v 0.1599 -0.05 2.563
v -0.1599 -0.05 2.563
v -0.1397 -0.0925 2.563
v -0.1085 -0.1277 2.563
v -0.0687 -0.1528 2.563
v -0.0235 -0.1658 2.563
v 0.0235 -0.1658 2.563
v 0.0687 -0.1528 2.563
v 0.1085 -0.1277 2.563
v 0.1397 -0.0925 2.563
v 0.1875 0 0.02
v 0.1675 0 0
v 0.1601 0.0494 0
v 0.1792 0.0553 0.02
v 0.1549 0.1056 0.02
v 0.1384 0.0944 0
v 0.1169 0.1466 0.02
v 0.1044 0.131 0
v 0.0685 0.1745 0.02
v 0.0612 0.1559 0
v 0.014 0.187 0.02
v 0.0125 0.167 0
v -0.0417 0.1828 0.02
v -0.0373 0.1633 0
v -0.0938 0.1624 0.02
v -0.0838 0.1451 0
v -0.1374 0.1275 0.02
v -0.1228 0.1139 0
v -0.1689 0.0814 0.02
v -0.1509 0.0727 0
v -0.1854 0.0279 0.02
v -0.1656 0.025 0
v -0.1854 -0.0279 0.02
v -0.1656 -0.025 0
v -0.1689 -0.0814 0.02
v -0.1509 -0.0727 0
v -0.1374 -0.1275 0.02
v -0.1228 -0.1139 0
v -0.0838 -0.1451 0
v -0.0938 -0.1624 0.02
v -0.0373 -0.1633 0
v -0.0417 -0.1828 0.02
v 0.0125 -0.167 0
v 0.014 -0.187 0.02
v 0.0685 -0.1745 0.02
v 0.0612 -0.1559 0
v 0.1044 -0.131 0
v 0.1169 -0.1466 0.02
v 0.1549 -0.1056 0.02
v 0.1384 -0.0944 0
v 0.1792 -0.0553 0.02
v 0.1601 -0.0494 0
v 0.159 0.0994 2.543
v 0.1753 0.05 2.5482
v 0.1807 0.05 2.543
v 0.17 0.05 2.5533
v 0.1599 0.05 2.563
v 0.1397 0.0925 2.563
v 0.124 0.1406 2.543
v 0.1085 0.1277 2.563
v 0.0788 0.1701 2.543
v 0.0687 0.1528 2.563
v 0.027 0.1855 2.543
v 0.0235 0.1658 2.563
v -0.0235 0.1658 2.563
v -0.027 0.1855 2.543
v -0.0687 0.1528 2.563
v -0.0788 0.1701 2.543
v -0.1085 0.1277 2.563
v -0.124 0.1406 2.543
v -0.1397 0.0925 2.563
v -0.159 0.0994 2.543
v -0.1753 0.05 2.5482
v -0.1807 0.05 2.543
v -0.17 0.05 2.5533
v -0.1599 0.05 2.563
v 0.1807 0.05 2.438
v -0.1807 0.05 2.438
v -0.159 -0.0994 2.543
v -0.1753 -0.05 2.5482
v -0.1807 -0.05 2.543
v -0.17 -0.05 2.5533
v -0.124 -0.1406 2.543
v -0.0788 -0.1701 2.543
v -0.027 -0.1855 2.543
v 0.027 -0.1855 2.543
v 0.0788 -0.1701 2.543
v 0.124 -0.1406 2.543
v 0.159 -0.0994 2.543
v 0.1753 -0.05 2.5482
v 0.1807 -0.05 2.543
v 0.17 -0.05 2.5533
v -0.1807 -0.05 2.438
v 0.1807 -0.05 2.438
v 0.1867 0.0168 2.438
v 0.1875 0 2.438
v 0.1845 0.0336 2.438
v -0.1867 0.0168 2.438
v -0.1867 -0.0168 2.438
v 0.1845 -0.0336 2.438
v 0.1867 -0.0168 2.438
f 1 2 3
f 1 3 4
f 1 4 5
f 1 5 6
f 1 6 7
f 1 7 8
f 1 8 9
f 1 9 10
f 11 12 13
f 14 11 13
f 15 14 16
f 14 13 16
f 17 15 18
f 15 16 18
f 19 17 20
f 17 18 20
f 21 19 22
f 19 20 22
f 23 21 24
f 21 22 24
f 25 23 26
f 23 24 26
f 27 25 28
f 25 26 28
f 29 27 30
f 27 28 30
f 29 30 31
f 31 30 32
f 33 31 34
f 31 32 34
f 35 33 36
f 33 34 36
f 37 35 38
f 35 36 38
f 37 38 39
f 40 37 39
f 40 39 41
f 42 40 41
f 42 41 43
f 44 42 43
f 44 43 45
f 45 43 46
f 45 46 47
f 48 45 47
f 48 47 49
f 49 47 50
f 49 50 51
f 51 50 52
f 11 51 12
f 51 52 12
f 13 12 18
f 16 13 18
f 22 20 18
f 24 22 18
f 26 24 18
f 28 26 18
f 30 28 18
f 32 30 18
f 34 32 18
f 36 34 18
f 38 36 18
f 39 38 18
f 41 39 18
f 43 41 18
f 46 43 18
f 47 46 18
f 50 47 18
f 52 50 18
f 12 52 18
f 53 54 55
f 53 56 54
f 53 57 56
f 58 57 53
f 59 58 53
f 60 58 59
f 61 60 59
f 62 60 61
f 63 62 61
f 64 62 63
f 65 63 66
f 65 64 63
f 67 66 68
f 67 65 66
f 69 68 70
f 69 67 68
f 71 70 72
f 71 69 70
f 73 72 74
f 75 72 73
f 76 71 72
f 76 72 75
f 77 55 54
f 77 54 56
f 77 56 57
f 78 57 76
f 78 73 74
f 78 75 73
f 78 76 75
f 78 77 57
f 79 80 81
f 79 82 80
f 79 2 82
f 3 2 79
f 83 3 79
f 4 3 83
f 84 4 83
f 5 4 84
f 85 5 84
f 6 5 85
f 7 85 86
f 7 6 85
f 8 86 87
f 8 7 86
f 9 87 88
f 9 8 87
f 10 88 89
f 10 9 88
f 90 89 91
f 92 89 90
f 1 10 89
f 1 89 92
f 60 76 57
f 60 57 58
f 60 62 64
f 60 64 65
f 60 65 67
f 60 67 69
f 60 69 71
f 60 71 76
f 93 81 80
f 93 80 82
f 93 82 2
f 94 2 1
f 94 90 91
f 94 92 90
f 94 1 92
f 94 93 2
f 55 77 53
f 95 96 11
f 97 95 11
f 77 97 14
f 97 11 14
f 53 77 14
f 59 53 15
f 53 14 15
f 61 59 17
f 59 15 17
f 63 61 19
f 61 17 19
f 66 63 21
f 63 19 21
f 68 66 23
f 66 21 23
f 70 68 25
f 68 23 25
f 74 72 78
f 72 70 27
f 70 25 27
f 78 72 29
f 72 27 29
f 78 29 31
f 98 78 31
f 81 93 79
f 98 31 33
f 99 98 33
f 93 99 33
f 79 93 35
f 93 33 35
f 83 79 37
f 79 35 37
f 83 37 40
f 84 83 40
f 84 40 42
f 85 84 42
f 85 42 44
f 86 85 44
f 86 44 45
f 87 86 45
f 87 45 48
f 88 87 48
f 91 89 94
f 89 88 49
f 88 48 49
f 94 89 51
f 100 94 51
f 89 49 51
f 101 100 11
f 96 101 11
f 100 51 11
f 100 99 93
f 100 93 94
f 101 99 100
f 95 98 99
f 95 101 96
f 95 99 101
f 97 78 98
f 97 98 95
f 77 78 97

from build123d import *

# Parameters (mm, degrees)
SKETCH1_R           = 0.1875
BOSS_EXTRUDE1_DEPTH = 2.563
CUT_EXTRUDE1_START  = -0.125
CUT_EXTRUDE1_DEPTH  = 0.125
CHAMFER1_SIZE       = 0.02
CHAMFER2_SIZE       = 0.02
CHAMFER3_SIZE       = 0.02


with BuildPart() as part:
    # Sketch1 → Boss-Extrude1 (new body)
    with BuildSketch(Plane.XY):
        Circle(SKETCH1_R)
    extrude(amount=BOSS_EXTRUDE1_DEPTH)

    # Sketch2 → Cut-Extrude1 (cut)
    with BuildSketch(Plane.XY.offset(2.563).offset(CUT_EXTRUDE1_START)):
        with BuildLine():
            Line((0.180710404, 0.05), (-0.180710404, 0.05))
            ThreePointArc((-0.180710404, 0.05), (-0.1875, 0), (-0.180710404, -0.05))
            Line((-0.180710404, -0.05), (0.180710404, -0.05))
            ThreePointArc((0.180710404, -0.05), (0.185794847, -0.02522944), (0.1875, 0))
            ThreePointArc((0.1875, 0), (0.185794847, 0.02522944), (0.180710404, 0.05))
        make_face()
    extrude(amount=CUT_EXTRUDE1_DEPTH, mode=Mode.SUBTRACT)

    # Chamfer1
    chamfer1_edges = [part.edges().sort_by_distance(p)[0] for p in [
        (0, 0.1875, 2.563),
    ]]
    chamfer(chamfer1_edges, length=CHAMFER1_SIZE)

    # Chamfer2
    chamfer2_edges = [part.edges().sort_by_distance(p)[0] for p in [
        (0, -0.1875, 2.563),
    ]]
    chamfer(chamfer2_edges, length=CHAMFER2_SIZE)

    # Chamfer3
    chamfer3_edges = [part.edges().sort_by_distance(p)[0] for p in [
        (-0.1875, 0, 0),
    ]]
    chamfer(chamfer3_edges, length=CHAMFER3_SIZE)


solid = part.part
